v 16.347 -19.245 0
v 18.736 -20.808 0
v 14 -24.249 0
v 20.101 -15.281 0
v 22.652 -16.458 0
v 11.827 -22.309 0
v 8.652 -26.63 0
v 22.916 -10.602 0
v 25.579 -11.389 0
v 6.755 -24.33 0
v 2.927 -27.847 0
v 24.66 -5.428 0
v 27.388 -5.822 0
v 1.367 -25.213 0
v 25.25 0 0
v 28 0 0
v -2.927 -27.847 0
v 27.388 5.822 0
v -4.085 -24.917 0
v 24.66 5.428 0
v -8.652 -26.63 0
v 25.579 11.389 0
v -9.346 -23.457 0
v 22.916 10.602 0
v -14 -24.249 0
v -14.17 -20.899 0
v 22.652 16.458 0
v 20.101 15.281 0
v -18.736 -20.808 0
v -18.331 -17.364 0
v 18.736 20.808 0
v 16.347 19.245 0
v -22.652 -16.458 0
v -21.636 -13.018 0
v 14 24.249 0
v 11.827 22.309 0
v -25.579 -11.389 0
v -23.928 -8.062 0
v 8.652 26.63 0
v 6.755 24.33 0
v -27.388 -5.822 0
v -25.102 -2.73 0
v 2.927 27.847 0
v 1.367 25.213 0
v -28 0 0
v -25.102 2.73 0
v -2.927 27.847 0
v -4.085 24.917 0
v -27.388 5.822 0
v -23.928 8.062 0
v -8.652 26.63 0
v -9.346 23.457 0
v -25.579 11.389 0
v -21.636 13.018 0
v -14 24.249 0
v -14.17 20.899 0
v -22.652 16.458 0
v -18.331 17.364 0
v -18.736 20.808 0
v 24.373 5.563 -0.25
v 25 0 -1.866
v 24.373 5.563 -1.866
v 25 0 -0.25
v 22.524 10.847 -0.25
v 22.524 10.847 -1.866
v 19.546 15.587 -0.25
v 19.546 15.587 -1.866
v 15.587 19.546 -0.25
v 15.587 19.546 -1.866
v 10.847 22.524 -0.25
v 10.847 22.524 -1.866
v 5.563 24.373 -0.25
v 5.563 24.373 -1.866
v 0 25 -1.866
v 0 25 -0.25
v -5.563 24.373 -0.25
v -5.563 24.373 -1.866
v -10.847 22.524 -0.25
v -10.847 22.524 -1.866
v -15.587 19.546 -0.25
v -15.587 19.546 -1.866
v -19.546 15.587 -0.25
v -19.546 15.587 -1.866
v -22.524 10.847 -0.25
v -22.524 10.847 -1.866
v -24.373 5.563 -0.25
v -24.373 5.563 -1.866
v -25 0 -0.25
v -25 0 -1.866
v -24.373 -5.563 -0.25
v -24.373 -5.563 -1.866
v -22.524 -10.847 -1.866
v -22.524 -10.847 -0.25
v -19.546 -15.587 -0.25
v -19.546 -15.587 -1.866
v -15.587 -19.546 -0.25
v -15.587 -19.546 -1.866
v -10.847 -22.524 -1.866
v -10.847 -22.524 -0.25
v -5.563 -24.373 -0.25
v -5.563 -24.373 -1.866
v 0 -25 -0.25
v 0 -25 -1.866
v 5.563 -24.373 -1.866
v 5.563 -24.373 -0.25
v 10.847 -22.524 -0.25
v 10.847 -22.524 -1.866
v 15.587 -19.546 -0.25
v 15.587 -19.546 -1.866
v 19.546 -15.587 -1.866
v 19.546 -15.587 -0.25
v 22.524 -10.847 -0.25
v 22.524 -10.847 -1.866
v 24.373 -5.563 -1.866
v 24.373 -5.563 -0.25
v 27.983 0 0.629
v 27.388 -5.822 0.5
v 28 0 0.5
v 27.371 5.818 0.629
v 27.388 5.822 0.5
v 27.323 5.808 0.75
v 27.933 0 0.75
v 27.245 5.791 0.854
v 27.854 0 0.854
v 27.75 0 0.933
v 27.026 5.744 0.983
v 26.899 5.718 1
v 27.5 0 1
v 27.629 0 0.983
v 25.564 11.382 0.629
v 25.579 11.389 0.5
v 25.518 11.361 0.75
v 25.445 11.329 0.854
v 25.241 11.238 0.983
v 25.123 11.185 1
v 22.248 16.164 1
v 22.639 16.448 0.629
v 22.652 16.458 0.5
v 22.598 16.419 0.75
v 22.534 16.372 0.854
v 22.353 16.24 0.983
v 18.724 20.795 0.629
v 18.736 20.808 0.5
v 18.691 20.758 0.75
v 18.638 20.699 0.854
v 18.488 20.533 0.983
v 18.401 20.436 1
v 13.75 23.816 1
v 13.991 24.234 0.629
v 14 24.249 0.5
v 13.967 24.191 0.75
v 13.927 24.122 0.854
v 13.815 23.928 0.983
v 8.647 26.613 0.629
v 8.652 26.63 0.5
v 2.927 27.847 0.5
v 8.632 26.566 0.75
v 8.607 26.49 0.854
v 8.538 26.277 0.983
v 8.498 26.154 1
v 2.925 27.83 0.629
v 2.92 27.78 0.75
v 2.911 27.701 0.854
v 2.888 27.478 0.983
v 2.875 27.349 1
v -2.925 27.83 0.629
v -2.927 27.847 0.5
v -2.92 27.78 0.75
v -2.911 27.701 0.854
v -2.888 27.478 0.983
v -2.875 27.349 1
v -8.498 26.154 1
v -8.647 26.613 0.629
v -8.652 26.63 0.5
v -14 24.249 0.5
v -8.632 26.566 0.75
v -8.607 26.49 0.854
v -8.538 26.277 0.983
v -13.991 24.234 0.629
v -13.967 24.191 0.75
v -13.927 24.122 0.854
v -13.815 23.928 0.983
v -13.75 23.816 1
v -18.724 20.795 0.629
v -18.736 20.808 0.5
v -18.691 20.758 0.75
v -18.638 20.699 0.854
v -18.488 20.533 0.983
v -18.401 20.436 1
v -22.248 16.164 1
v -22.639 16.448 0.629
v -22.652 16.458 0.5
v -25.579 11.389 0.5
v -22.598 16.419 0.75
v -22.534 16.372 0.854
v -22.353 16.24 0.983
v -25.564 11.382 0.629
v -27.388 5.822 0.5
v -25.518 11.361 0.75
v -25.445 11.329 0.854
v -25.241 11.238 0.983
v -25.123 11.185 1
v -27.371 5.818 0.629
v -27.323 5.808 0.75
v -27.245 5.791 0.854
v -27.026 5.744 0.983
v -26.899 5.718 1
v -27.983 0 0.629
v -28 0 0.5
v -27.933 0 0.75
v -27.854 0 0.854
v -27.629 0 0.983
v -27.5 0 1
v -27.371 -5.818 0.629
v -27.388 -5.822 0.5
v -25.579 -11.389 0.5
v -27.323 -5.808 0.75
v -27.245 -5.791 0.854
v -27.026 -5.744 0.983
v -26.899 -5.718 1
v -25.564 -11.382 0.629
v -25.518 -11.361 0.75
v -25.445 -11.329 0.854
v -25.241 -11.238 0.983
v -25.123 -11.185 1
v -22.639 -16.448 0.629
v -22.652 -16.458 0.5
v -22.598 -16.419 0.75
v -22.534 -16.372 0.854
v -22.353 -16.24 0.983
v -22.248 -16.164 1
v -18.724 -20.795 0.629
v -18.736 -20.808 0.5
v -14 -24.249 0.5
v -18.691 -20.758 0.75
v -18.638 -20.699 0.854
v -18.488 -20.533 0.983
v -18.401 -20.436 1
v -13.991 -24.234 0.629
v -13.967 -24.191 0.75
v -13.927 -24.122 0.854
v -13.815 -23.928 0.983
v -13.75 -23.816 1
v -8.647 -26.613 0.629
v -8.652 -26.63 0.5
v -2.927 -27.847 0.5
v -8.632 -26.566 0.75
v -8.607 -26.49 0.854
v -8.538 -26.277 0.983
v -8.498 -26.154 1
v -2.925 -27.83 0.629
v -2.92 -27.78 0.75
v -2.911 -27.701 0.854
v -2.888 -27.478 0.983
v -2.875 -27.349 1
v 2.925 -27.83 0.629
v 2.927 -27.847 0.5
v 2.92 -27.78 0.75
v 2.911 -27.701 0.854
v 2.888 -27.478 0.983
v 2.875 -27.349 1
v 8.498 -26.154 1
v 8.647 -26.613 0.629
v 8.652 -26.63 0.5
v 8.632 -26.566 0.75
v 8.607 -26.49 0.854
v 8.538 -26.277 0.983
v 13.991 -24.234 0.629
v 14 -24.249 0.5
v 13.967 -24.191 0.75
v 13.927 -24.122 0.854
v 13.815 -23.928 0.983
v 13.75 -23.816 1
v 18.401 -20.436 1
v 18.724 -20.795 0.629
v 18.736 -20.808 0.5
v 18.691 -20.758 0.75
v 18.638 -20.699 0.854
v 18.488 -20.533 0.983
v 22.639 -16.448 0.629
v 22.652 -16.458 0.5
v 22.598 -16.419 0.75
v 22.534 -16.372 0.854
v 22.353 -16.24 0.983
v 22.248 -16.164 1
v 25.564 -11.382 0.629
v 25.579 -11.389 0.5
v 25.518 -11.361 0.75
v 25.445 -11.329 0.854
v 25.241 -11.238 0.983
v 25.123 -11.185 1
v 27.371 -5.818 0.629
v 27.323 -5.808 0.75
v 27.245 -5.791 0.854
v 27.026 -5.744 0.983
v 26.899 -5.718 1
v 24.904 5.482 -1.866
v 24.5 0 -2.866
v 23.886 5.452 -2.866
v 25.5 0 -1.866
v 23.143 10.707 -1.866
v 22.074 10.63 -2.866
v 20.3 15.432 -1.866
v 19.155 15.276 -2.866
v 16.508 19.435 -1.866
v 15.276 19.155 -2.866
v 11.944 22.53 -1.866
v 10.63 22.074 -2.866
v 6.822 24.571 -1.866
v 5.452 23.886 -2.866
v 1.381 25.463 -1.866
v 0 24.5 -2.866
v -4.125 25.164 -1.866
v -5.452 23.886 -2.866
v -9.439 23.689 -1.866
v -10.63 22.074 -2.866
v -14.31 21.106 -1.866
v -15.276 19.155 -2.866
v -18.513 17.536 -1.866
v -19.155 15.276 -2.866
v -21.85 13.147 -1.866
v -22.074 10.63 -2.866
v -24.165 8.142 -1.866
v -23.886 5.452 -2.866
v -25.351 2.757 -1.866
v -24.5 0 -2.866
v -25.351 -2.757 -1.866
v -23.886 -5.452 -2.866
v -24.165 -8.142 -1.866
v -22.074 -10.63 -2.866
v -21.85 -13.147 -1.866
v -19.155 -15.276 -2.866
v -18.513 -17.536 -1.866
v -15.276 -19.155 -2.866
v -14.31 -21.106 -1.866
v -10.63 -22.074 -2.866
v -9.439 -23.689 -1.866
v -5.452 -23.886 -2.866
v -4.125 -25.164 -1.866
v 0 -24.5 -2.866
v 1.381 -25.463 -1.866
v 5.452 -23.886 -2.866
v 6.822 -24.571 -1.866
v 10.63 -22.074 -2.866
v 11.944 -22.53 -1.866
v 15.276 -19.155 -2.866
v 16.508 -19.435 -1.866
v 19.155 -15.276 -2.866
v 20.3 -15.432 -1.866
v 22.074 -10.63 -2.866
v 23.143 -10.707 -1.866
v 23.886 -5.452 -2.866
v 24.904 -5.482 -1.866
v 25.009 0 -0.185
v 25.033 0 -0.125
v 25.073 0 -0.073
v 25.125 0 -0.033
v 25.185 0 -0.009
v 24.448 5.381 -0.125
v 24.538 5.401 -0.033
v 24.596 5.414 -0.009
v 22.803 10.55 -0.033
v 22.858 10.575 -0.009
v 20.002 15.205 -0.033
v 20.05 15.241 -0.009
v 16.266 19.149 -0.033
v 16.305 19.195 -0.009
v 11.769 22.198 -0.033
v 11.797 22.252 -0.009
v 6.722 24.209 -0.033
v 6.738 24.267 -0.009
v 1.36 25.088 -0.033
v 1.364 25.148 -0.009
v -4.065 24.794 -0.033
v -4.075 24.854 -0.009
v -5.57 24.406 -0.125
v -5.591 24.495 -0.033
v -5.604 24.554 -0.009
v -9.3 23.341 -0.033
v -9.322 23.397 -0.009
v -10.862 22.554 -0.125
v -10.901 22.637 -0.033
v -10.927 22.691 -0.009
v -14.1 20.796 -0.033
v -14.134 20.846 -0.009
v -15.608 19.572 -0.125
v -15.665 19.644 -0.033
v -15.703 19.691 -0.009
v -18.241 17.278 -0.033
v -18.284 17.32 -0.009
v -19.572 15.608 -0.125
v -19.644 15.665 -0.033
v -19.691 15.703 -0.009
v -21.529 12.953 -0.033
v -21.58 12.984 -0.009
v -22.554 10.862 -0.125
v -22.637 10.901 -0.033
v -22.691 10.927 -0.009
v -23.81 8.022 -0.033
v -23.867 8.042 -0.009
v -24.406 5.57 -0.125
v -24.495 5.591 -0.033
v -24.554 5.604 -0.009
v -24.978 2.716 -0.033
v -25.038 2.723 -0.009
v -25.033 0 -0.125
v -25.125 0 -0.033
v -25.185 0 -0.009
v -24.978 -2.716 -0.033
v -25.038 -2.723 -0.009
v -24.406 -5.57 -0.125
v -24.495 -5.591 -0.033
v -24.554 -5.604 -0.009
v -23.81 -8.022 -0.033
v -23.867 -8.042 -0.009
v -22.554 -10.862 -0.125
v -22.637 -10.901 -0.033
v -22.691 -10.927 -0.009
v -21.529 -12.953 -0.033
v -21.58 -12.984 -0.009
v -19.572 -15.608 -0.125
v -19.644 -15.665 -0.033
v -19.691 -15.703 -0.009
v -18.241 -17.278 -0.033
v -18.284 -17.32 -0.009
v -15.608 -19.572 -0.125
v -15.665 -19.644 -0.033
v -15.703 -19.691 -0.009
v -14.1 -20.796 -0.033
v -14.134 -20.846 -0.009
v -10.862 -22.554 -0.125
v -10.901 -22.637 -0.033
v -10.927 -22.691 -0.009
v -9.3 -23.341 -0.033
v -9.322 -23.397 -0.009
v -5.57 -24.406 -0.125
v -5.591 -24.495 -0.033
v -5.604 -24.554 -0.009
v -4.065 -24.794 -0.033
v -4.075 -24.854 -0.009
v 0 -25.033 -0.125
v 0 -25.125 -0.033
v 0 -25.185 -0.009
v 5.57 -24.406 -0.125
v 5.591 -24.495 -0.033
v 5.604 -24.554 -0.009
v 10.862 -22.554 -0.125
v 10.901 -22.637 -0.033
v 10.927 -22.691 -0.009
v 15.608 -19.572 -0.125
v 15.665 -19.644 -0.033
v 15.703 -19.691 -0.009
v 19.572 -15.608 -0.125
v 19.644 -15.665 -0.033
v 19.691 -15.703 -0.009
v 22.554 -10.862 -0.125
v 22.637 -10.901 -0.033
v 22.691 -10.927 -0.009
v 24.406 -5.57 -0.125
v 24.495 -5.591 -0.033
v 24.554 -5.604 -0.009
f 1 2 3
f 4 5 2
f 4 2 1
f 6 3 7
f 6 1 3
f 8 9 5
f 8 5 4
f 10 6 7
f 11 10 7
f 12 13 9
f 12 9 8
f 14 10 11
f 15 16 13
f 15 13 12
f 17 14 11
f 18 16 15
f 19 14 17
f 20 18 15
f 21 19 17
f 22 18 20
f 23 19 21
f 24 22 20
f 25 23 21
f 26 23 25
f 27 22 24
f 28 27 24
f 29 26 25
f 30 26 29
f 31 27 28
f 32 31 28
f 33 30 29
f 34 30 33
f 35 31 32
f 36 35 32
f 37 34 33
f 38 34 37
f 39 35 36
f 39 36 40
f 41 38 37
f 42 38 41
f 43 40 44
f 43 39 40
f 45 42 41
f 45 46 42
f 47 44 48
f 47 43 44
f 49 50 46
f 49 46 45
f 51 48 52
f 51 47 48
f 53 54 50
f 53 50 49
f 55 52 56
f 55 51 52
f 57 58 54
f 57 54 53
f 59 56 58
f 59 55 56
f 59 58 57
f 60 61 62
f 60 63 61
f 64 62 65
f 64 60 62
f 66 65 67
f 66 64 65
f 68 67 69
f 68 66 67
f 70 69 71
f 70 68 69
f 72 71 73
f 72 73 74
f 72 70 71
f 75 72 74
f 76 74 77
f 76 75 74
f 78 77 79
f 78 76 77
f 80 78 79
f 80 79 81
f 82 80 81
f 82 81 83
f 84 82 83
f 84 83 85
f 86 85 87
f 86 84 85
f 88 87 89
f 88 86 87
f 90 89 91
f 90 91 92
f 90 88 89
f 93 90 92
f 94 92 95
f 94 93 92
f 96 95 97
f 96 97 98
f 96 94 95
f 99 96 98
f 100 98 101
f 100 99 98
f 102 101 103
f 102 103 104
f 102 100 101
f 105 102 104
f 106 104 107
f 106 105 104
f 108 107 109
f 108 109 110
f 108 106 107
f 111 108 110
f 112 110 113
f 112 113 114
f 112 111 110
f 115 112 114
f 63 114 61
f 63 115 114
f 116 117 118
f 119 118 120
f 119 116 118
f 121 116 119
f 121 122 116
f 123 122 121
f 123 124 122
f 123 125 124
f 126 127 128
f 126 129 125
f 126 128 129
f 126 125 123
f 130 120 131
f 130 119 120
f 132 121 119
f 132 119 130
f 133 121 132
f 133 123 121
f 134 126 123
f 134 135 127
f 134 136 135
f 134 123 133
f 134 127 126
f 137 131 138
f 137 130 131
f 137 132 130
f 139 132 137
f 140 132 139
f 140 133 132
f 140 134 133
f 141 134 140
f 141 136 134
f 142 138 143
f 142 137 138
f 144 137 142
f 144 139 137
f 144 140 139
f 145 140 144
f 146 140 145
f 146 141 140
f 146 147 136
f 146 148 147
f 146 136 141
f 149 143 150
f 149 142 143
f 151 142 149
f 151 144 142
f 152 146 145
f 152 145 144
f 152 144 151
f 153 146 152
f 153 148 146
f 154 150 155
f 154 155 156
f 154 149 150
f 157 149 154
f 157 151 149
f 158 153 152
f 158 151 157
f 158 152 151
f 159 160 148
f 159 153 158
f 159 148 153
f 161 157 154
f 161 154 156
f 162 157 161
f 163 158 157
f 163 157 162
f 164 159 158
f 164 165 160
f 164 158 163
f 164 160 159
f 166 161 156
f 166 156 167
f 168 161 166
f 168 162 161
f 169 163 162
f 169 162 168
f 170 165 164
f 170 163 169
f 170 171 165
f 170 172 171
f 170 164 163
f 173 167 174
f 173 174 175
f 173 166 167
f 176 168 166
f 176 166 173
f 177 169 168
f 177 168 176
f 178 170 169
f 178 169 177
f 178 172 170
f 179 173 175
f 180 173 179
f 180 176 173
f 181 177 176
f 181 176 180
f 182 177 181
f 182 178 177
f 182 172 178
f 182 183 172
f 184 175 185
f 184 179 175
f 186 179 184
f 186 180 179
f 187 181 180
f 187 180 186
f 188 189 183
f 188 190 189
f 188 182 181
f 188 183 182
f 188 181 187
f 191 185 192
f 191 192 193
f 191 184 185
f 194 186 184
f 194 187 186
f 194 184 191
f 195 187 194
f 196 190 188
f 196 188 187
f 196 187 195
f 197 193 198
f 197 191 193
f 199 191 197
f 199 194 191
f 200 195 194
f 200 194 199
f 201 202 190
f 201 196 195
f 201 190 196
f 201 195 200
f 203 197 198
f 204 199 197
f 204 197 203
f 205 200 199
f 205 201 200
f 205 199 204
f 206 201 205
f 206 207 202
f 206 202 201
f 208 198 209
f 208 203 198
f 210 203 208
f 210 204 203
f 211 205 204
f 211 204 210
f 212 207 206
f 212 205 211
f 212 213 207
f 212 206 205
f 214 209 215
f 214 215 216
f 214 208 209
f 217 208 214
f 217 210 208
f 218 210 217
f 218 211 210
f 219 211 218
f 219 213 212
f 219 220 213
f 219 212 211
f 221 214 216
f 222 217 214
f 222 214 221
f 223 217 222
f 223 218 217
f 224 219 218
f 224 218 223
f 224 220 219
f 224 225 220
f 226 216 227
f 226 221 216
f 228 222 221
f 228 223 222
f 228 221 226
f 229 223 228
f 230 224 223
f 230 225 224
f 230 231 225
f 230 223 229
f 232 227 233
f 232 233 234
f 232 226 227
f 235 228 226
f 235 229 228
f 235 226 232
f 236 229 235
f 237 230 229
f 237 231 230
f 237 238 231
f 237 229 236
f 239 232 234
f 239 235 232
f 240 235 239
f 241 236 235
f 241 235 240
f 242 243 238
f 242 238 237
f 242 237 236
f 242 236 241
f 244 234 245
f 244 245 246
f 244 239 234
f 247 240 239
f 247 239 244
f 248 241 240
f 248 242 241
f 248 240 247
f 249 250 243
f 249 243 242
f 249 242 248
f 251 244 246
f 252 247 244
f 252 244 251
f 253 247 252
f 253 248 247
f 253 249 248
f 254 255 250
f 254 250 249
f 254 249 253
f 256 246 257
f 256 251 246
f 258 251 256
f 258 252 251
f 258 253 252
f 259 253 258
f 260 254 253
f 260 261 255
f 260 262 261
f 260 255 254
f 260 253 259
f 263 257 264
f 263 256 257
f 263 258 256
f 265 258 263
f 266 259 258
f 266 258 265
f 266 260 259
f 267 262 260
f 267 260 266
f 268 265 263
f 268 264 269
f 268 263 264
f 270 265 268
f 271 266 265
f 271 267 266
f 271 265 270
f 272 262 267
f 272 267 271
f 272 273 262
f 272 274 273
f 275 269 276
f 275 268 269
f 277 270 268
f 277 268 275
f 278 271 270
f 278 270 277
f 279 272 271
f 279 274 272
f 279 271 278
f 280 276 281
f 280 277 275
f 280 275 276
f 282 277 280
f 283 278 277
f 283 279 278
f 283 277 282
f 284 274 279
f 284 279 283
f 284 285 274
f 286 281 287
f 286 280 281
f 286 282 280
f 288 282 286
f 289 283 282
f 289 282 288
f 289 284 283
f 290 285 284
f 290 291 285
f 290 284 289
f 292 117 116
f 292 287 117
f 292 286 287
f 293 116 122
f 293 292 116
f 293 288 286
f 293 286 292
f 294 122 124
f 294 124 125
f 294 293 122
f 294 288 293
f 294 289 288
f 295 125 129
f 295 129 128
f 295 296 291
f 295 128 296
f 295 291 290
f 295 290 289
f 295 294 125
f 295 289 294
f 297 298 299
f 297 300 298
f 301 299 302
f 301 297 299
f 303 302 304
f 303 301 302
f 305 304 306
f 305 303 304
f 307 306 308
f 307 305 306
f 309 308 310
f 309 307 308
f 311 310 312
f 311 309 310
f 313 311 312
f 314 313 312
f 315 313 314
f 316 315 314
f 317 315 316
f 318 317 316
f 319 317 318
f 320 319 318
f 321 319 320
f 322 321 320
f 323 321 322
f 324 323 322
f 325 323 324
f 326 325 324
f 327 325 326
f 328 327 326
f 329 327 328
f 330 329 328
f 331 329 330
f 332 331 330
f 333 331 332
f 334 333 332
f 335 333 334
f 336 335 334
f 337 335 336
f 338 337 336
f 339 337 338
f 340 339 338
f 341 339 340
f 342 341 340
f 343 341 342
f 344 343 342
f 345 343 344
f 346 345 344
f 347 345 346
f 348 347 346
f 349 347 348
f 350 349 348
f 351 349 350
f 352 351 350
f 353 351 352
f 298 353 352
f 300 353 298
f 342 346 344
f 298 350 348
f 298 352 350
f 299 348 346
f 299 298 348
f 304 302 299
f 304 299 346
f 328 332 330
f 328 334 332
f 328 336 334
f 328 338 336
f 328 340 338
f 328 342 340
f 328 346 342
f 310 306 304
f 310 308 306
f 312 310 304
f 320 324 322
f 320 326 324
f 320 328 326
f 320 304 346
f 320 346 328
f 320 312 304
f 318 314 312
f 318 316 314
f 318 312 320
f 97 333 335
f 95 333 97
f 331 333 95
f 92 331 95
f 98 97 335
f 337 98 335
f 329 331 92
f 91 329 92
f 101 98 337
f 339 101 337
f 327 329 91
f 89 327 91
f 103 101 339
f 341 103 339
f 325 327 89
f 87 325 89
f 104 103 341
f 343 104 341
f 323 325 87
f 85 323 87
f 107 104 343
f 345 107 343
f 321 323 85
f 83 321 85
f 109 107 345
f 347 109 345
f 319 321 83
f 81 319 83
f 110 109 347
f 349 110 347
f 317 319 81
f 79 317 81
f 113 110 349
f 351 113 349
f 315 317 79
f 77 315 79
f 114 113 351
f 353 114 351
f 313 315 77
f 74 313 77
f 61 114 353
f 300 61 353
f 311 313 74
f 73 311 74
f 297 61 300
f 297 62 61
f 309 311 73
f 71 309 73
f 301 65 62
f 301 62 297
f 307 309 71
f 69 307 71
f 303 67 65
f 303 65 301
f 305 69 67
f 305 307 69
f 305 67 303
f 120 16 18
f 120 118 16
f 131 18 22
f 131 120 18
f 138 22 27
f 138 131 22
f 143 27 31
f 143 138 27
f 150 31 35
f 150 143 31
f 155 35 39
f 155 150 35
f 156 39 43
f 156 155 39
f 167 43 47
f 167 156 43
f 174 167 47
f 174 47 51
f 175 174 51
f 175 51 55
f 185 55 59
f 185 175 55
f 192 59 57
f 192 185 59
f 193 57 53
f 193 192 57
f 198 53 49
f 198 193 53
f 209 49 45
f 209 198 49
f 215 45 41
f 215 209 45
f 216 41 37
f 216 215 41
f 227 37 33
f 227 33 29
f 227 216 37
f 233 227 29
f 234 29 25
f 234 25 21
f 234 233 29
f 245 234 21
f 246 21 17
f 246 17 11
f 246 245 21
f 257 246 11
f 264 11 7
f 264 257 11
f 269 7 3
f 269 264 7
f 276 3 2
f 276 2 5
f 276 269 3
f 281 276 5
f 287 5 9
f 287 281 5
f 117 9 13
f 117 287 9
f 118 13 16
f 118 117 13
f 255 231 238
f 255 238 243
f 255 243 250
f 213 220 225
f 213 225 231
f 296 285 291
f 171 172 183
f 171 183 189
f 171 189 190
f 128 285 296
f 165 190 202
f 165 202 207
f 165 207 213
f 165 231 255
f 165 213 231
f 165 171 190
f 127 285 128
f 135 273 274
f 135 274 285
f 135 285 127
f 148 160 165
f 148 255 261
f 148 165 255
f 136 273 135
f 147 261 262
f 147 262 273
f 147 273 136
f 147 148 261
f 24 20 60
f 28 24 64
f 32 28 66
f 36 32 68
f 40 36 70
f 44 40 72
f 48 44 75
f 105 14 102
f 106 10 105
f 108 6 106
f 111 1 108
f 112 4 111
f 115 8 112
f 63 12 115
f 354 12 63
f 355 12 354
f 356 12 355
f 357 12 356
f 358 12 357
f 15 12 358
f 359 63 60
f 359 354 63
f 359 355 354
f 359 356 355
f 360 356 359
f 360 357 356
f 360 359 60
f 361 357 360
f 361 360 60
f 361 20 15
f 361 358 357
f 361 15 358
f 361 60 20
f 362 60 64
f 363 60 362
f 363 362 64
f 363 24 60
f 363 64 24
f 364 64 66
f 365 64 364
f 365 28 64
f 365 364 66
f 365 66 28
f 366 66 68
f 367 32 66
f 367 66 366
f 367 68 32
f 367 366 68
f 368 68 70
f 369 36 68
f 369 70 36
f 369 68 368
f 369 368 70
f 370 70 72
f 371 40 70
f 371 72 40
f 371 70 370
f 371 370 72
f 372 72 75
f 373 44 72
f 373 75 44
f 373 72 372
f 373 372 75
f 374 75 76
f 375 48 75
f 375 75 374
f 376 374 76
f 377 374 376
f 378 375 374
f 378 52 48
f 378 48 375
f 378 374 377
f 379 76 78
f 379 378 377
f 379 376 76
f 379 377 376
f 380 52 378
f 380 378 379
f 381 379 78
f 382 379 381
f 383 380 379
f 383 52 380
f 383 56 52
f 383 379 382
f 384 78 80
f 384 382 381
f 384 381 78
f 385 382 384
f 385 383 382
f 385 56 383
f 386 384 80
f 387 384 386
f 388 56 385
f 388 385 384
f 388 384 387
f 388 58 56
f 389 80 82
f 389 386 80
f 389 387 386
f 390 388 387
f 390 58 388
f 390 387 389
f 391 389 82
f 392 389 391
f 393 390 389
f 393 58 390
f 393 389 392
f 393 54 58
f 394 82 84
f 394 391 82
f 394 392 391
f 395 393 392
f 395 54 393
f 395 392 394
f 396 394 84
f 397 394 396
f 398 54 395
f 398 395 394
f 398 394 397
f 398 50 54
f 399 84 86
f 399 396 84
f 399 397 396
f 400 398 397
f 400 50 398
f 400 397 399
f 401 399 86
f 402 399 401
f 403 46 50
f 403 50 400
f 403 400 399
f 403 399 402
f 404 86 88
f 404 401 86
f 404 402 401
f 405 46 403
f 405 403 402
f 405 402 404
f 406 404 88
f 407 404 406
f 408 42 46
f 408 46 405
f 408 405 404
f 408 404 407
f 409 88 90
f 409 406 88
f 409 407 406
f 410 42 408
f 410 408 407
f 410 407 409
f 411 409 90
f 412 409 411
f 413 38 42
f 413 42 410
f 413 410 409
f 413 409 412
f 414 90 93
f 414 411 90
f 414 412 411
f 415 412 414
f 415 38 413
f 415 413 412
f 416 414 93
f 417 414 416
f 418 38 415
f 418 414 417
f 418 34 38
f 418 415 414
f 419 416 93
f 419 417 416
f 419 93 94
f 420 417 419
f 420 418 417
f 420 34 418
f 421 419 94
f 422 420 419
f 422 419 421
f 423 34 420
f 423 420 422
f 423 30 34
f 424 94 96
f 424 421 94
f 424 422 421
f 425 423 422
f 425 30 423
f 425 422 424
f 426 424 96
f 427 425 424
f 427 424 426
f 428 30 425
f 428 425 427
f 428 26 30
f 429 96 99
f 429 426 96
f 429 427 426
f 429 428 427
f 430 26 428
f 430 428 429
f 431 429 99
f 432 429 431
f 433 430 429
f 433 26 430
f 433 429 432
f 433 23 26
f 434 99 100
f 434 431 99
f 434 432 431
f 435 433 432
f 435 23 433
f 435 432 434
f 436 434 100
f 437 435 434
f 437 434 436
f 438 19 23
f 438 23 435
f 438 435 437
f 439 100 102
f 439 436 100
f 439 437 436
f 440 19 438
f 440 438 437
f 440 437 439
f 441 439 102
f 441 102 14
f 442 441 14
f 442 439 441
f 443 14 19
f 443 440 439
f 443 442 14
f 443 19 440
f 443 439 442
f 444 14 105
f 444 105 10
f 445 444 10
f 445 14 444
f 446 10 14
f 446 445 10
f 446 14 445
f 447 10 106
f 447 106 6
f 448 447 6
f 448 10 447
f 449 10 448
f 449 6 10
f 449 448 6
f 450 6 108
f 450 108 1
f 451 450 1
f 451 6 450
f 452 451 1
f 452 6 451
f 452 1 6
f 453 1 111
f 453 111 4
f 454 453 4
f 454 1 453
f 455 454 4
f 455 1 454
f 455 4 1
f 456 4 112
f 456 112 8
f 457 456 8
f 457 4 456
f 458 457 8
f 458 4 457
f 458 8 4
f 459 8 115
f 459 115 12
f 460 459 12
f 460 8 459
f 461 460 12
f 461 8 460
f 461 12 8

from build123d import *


with BuildPart() as f1:
    # F0 (on Front) → F1 (revolve)
    with BuildSketch(Plane.XZ):
        with BuildLine():
            Line((0, 1), (0, 0))
            Line((0, 0), (0, -2.866025))
            Line((0, -2.866025), (24.5, -2.866025))
            Line((24.5, -2.866025), (25.5, -1.866025))
            Line((25.5, -1.866025), (25, -1.866025))
            Line((25, -1.866025), (25, -1))
            Line((25, -1), (25, -0.25))
            ThreePointArc((25, -0.25), (25.073223, -0.073223), (25.25, 0))
            Line((25.25, 0), (28, 0))
            Line((28, 0), (28, 0.5))
            ThreePointArc((28, 0.5), (27.853553, 0.853553), (27.5, 1))
            Line((27.5, 1), (0, 1))
        make_face()
    revolve(axis=Axis((0, 0, -1.433013), (0, 0, 1)))


solid = f1.part
